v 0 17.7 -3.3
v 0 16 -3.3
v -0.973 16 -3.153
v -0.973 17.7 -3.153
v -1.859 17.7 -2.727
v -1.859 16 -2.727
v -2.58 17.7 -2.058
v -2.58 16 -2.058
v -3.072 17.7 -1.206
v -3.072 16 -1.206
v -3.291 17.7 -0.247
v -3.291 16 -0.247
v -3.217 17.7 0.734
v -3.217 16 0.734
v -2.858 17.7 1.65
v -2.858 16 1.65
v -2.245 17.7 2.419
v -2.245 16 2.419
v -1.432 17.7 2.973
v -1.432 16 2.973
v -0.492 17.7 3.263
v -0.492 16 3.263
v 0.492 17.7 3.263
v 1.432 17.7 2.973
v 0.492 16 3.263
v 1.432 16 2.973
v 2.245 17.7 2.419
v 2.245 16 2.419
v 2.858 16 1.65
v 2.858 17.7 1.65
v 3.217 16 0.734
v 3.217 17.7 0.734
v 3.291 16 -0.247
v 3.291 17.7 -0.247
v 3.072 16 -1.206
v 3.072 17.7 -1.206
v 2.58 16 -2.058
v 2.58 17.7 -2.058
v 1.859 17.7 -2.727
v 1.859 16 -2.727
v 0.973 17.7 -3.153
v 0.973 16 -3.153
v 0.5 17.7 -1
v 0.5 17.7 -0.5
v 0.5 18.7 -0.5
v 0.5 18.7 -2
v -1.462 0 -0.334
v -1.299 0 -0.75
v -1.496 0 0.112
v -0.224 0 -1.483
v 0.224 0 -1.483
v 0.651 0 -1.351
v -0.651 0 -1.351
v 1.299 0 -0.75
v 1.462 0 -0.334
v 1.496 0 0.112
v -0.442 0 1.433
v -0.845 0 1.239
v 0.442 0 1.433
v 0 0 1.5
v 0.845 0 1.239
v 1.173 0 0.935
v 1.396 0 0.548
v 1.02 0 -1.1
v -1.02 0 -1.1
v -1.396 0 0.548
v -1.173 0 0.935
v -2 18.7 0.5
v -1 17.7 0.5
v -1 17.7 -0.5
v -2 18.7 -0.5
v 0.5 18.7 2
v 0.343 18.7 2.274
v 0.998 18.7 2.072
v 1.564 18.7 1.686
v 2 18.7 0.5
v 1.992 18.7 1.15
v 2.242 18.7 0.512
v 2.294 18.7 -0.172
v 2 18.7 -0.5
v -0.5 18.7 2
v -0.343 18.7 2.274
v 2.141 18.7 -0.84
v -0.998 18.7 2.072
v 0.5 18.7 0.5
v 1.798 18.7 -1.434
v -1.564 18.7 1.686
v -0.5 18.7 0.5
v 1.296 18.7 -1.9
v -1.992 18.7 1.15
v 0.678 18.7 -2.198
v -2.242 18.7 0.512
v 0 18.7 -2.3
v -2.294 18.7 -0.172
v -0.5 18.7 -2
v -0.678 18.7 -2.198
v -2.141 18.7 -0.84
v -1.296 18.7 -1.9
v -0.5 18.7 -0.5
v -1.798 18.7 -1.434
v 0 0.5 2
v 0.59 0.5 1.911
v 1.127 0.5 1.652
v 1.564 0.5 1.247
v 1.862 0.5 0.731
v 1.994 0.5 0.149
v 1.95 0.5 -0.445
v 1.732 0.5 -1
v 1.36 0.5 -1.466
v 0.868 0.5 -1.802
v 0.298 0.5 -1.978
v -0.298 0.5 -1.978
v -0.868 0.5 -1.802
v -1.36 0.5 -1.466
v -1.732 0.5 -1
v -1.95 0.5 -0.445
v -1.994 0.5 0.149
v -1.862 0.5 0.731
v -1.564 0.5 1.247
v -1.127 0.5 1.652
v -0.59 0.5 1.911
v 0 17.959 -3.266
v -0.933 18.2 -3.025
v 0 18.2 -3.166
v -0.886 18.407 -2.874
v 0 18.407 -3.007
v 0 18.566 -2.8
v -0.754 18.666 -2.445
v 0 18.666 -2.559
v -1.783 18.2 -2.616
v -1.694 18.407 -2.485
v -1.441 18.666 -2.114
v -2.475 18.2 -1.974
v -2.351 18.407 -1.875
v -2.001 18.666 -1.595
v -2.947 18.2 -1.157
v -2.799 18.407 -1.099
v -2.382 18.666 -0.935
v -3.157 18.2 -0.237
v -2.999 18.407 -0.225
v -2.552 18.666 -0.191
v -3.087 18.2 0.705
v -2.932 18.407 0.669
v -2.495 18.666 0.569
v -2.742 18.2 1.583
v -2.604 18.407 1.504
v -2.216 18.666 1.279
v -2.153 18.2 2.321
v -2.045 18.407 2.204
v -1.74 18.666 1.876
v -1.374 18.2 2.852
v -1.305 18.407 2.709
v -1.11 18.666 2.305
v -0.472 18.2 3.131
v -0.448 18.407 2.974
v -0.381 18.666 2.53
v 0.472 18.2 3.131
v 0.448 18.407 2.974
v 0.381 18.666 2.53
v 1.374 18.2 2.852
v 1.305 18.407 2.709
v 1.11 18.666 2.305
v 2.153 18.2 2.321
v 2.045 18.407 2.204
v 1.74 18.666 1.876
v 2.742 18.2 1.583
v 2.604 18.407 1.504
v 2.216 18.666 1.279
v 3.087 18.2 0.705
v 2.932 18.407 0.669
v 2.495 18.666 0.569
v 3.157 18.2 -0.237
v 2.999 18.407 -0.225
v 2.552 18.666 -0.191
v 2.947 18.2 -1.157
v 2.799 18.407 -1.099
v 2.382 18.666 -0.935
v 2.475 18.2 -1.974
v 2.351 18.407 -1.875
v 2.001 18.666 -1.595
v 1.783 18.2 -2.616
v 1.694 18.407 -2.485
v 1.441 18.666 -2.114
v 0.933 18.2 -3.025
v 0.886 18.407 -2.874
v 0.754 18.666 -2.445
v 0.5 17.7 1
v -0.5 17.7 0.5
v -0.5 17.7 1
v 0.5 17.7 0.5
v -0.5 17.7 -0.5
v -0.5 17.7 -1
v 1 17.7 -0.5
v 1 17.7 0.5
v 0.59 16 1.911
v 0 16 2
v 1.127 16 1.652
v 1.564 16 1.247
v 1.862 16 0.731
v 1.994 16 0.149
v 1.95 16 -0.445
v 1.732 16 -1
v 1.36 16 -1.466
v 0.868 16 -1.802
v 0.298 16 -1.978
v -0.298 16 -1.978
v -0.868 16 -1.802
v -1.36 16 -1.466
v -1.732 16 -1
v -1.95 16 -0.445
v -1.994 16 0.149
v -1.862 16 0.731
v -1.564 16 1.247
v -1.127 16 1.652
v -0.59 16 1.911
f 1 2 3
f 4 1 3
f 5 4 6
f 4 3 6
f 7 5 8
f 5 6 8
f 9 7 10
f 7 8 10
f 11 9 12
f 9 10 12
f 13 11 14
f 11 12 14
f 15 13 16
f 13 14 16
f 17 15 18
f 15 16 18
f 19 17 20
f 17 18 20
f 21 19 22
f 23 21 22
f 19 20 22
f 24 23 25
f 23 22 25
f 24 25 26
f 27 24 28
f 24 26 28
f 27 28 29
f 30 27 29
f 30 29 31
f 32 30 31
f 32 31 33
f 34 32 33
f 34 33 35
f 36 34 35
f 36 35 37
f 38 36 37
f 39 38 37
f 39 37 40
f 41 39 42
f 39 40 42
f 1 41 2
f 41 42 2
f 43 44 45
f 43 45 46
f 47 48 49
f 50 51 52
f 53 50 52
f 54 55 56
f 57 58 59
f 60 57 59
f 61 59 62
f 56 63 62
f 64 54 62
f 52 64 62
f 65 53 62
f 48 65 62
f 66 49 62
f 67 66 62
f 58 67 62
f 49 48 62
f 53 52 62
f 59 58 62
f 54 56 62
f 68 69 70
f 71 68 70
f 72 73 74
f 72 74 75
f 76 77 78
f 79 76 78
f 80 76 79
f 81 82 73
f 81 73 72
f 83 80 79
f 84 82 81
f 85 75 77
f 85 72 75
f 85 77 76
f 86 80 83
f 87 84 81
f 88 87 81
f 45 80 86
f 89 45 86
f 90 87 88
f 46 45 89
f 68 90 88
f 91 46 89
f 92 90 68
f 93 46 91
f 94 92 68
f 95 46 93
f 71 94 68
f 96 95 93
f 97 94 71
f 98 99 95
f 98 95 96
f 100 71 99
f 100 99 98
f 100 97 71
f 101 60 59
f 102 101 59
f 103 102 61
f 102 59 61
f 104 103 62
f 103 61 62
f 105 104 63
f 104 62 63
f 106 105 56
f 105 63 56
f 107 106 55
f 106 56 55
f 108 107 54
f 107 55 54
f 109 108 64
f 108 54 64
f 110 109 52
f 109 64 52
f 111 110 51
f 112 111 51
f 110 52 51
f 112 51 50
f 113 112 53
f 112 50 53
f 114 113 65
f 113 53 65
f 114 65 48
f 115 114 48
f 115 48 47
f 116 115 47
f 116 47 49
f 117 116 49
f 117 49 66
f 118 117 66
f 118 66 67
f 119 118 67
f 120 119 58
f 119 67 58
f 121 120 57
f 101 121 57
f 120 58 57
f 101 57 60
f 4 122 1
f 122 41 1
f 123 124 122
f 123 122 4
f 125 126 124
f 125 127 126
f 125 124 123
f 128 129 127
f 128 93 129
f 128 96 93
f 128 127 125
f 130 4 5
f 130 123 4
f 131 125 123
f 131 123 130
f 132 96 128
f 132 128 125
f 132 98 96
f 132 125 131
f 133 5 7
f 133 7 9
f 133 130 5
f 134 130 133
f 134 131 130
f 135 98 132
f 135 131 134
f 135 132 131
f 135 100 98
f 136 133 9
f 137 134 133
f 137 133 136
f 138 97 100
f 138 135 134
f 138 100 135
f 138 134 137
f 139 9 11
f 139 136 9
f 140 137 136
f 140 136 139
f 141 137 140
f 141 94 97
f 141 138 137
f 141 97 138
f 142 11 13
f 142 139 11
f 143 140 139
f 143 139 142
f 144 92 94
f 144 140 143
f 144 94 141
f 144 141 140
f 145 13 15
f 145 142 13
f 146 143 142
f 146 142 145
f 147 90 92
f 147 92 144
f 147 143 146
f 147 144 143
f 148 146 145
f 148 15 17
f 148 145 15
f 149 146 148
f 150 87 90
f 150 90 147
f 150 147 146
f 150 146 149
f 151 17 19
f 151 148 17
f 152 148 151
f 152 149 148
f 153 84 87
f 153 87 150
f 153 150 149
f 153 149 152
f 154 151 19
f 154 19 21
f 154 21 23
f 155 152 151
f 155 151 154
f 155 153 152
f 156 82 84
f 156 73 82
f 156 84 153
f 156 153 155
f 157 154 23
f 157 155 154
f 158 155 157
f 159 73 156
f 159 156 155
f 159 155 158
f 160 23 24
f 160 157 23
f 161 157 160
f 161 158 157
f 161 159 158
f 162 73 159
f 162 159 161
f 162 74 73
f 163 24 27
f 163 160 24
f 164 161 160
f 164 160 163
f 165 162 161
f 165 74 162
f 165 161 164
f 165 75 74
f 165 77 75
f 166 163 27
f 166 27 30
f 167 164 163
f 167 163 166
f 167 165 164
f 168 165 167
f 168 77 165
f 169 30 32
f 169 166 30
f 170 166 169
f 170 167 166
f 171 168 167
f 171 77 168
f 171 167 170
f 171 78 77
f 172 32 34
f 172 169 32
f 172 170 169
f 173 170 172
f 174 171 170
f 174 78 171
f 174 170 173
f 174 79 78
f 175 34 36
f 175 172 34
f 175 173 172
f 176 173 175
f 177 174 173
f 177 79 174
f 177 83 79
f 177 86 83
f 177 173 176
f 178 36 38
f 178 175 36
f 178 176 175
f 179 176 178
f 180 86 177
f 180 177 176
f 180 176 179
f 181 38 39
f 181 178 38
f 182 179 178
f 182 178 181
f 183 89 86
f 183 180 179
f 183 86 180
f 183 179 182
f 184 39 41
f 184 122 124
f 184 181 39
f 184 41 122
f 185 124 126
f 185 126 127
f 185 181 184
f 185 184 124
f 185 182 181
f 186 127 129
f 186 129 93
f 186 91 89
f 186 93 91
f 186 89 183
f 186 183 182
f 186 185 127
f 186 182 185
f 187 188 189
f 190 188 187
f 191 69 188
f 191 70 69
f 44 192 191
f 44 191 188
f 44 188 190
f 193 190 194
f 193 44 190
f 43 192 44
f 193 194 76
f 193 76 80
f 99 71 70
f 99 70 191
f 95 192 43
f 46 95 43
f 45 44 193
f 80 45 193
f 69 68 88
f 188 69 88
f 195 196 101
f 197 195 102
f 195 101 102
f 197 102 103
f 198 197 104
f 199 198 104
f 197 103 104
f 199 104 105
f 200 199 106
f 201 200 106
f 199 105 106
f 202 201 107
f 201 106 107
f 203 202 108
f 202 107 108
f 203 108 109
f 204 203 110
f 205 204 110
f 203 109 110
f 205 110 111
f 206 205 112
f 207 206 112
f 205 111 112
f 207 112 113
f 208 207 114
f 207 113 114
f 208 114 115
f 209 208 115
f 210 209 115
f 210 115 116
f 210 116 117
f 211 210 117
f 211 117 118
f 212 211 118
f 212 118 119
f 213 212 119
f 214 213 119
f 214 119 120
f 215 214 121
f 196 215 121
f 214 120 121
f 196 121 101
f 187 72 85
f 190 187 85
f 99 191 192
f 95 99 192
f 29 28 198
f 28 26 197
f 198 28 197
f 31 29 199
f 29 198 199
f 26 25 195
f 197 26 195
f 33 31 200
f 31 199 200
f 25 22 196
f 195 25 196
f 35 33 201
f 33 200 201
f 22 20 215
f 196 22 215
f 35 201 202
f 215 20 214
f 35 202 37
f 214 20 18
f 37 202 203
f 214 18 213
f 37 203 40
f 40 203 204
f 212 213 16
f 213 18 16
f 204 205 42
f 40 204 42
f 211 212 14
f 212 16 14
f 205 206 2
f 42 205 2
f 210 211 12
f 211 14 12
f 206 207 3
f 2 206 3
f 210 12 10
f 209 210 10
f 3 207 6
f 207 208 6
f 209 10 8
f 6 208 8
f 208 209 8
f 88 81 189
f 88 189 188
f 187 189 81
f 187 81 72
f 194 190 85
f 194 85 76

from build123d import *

# Parameters (mm, degrees)
SKETCH_1_R          = 2
EXTRUDE_1_DEPTH     = 16
SKETCH_2_R          = 3.3
EXTRUDE_2_DEPTH     = 2.7
FILLET_1_R          = 1
CHAMFER_1_SIZE      = 0.5
SKETCH_3_W          = 4
SKETCH_3_H          = 1
SKETCH_3_W_2        = 1
SKETCH_3_H_2        = 4
CUT_EXTRUDE_1_DEPTH = 1
CHAMFER_2_SIZE      = 1


with BuildPart() as part:
    # 草图1 → 凸台-拉伸1 (new body)
    with BuildSketch(Plane(origin=(0, 0, 0), x_dir=(1, 0, 0), z_dir=(0, 1, 0))):
        with Locations(Location((0, 0, 0), (0, 0, 270))):
            Circle(SKETCH_1_R)
    extrude(amount=EXTRUDE_1_DEPTH)

    # 草图2 → 凸台-拉伸2 (add)
    with BuildSketch(Plane(origin=(0, 16, 0), x_dir=(1, 0, 0), z_dir=(0, 1, 0))):
        with Locations(Location((0, 0, 0), (0, 0, 90))):
            Circle(SKETCH_2_R)
    extrude(amount=EXTRUDE_2_DEPTH)

    # 圆角1
    fillet_1_edges = [part.edges().sort_by_distance(p)[0] for p in [
        (0, 18.7, 3.3),
    ]]
    fillet(fillet_1_edges, radius=FILLET_1_R)

    # 倒角1
    chamfer_1_edges = [part.edges().sort_by_distance(p)[0] for p in [
        (0, 0, -2),
    ]]
    chamfer(chamfer_1_edges, length=CHAMFER_1_SIZE)

    # 草图3 → 切除-拉伸-薄壁1 (cut)
    with BuildSketch(Plane(origin=(0, 18.7, 0), x_dir=(1, 0, 0), z_dir=(0, 1, 0))):
        Rectangle(SKETCH_3_W, SKETCH_3_H)
        Rectangle(SKETCH_3_W_2, SKETCH_3_H_2)
    extrude(amount=-CUT_EXTRUDE_1_DEPTH, mode=Mode.SUBTRACT)

    # 倒角2
    chamfer_2_edges = [part.edges().sort_by_distance(p)[0] for p in [
        (0, 17.7, 2),
        (2, 17.7, 0),
        (0, 17.7, -2),
        (-2, 17.7, 0),
    ]]
    chamfer(chamfer_2_edges, length=CHAMFER_2_SIZE - 0.0001)  # a hair under: the kernel refuses the full size


solid = part.part
